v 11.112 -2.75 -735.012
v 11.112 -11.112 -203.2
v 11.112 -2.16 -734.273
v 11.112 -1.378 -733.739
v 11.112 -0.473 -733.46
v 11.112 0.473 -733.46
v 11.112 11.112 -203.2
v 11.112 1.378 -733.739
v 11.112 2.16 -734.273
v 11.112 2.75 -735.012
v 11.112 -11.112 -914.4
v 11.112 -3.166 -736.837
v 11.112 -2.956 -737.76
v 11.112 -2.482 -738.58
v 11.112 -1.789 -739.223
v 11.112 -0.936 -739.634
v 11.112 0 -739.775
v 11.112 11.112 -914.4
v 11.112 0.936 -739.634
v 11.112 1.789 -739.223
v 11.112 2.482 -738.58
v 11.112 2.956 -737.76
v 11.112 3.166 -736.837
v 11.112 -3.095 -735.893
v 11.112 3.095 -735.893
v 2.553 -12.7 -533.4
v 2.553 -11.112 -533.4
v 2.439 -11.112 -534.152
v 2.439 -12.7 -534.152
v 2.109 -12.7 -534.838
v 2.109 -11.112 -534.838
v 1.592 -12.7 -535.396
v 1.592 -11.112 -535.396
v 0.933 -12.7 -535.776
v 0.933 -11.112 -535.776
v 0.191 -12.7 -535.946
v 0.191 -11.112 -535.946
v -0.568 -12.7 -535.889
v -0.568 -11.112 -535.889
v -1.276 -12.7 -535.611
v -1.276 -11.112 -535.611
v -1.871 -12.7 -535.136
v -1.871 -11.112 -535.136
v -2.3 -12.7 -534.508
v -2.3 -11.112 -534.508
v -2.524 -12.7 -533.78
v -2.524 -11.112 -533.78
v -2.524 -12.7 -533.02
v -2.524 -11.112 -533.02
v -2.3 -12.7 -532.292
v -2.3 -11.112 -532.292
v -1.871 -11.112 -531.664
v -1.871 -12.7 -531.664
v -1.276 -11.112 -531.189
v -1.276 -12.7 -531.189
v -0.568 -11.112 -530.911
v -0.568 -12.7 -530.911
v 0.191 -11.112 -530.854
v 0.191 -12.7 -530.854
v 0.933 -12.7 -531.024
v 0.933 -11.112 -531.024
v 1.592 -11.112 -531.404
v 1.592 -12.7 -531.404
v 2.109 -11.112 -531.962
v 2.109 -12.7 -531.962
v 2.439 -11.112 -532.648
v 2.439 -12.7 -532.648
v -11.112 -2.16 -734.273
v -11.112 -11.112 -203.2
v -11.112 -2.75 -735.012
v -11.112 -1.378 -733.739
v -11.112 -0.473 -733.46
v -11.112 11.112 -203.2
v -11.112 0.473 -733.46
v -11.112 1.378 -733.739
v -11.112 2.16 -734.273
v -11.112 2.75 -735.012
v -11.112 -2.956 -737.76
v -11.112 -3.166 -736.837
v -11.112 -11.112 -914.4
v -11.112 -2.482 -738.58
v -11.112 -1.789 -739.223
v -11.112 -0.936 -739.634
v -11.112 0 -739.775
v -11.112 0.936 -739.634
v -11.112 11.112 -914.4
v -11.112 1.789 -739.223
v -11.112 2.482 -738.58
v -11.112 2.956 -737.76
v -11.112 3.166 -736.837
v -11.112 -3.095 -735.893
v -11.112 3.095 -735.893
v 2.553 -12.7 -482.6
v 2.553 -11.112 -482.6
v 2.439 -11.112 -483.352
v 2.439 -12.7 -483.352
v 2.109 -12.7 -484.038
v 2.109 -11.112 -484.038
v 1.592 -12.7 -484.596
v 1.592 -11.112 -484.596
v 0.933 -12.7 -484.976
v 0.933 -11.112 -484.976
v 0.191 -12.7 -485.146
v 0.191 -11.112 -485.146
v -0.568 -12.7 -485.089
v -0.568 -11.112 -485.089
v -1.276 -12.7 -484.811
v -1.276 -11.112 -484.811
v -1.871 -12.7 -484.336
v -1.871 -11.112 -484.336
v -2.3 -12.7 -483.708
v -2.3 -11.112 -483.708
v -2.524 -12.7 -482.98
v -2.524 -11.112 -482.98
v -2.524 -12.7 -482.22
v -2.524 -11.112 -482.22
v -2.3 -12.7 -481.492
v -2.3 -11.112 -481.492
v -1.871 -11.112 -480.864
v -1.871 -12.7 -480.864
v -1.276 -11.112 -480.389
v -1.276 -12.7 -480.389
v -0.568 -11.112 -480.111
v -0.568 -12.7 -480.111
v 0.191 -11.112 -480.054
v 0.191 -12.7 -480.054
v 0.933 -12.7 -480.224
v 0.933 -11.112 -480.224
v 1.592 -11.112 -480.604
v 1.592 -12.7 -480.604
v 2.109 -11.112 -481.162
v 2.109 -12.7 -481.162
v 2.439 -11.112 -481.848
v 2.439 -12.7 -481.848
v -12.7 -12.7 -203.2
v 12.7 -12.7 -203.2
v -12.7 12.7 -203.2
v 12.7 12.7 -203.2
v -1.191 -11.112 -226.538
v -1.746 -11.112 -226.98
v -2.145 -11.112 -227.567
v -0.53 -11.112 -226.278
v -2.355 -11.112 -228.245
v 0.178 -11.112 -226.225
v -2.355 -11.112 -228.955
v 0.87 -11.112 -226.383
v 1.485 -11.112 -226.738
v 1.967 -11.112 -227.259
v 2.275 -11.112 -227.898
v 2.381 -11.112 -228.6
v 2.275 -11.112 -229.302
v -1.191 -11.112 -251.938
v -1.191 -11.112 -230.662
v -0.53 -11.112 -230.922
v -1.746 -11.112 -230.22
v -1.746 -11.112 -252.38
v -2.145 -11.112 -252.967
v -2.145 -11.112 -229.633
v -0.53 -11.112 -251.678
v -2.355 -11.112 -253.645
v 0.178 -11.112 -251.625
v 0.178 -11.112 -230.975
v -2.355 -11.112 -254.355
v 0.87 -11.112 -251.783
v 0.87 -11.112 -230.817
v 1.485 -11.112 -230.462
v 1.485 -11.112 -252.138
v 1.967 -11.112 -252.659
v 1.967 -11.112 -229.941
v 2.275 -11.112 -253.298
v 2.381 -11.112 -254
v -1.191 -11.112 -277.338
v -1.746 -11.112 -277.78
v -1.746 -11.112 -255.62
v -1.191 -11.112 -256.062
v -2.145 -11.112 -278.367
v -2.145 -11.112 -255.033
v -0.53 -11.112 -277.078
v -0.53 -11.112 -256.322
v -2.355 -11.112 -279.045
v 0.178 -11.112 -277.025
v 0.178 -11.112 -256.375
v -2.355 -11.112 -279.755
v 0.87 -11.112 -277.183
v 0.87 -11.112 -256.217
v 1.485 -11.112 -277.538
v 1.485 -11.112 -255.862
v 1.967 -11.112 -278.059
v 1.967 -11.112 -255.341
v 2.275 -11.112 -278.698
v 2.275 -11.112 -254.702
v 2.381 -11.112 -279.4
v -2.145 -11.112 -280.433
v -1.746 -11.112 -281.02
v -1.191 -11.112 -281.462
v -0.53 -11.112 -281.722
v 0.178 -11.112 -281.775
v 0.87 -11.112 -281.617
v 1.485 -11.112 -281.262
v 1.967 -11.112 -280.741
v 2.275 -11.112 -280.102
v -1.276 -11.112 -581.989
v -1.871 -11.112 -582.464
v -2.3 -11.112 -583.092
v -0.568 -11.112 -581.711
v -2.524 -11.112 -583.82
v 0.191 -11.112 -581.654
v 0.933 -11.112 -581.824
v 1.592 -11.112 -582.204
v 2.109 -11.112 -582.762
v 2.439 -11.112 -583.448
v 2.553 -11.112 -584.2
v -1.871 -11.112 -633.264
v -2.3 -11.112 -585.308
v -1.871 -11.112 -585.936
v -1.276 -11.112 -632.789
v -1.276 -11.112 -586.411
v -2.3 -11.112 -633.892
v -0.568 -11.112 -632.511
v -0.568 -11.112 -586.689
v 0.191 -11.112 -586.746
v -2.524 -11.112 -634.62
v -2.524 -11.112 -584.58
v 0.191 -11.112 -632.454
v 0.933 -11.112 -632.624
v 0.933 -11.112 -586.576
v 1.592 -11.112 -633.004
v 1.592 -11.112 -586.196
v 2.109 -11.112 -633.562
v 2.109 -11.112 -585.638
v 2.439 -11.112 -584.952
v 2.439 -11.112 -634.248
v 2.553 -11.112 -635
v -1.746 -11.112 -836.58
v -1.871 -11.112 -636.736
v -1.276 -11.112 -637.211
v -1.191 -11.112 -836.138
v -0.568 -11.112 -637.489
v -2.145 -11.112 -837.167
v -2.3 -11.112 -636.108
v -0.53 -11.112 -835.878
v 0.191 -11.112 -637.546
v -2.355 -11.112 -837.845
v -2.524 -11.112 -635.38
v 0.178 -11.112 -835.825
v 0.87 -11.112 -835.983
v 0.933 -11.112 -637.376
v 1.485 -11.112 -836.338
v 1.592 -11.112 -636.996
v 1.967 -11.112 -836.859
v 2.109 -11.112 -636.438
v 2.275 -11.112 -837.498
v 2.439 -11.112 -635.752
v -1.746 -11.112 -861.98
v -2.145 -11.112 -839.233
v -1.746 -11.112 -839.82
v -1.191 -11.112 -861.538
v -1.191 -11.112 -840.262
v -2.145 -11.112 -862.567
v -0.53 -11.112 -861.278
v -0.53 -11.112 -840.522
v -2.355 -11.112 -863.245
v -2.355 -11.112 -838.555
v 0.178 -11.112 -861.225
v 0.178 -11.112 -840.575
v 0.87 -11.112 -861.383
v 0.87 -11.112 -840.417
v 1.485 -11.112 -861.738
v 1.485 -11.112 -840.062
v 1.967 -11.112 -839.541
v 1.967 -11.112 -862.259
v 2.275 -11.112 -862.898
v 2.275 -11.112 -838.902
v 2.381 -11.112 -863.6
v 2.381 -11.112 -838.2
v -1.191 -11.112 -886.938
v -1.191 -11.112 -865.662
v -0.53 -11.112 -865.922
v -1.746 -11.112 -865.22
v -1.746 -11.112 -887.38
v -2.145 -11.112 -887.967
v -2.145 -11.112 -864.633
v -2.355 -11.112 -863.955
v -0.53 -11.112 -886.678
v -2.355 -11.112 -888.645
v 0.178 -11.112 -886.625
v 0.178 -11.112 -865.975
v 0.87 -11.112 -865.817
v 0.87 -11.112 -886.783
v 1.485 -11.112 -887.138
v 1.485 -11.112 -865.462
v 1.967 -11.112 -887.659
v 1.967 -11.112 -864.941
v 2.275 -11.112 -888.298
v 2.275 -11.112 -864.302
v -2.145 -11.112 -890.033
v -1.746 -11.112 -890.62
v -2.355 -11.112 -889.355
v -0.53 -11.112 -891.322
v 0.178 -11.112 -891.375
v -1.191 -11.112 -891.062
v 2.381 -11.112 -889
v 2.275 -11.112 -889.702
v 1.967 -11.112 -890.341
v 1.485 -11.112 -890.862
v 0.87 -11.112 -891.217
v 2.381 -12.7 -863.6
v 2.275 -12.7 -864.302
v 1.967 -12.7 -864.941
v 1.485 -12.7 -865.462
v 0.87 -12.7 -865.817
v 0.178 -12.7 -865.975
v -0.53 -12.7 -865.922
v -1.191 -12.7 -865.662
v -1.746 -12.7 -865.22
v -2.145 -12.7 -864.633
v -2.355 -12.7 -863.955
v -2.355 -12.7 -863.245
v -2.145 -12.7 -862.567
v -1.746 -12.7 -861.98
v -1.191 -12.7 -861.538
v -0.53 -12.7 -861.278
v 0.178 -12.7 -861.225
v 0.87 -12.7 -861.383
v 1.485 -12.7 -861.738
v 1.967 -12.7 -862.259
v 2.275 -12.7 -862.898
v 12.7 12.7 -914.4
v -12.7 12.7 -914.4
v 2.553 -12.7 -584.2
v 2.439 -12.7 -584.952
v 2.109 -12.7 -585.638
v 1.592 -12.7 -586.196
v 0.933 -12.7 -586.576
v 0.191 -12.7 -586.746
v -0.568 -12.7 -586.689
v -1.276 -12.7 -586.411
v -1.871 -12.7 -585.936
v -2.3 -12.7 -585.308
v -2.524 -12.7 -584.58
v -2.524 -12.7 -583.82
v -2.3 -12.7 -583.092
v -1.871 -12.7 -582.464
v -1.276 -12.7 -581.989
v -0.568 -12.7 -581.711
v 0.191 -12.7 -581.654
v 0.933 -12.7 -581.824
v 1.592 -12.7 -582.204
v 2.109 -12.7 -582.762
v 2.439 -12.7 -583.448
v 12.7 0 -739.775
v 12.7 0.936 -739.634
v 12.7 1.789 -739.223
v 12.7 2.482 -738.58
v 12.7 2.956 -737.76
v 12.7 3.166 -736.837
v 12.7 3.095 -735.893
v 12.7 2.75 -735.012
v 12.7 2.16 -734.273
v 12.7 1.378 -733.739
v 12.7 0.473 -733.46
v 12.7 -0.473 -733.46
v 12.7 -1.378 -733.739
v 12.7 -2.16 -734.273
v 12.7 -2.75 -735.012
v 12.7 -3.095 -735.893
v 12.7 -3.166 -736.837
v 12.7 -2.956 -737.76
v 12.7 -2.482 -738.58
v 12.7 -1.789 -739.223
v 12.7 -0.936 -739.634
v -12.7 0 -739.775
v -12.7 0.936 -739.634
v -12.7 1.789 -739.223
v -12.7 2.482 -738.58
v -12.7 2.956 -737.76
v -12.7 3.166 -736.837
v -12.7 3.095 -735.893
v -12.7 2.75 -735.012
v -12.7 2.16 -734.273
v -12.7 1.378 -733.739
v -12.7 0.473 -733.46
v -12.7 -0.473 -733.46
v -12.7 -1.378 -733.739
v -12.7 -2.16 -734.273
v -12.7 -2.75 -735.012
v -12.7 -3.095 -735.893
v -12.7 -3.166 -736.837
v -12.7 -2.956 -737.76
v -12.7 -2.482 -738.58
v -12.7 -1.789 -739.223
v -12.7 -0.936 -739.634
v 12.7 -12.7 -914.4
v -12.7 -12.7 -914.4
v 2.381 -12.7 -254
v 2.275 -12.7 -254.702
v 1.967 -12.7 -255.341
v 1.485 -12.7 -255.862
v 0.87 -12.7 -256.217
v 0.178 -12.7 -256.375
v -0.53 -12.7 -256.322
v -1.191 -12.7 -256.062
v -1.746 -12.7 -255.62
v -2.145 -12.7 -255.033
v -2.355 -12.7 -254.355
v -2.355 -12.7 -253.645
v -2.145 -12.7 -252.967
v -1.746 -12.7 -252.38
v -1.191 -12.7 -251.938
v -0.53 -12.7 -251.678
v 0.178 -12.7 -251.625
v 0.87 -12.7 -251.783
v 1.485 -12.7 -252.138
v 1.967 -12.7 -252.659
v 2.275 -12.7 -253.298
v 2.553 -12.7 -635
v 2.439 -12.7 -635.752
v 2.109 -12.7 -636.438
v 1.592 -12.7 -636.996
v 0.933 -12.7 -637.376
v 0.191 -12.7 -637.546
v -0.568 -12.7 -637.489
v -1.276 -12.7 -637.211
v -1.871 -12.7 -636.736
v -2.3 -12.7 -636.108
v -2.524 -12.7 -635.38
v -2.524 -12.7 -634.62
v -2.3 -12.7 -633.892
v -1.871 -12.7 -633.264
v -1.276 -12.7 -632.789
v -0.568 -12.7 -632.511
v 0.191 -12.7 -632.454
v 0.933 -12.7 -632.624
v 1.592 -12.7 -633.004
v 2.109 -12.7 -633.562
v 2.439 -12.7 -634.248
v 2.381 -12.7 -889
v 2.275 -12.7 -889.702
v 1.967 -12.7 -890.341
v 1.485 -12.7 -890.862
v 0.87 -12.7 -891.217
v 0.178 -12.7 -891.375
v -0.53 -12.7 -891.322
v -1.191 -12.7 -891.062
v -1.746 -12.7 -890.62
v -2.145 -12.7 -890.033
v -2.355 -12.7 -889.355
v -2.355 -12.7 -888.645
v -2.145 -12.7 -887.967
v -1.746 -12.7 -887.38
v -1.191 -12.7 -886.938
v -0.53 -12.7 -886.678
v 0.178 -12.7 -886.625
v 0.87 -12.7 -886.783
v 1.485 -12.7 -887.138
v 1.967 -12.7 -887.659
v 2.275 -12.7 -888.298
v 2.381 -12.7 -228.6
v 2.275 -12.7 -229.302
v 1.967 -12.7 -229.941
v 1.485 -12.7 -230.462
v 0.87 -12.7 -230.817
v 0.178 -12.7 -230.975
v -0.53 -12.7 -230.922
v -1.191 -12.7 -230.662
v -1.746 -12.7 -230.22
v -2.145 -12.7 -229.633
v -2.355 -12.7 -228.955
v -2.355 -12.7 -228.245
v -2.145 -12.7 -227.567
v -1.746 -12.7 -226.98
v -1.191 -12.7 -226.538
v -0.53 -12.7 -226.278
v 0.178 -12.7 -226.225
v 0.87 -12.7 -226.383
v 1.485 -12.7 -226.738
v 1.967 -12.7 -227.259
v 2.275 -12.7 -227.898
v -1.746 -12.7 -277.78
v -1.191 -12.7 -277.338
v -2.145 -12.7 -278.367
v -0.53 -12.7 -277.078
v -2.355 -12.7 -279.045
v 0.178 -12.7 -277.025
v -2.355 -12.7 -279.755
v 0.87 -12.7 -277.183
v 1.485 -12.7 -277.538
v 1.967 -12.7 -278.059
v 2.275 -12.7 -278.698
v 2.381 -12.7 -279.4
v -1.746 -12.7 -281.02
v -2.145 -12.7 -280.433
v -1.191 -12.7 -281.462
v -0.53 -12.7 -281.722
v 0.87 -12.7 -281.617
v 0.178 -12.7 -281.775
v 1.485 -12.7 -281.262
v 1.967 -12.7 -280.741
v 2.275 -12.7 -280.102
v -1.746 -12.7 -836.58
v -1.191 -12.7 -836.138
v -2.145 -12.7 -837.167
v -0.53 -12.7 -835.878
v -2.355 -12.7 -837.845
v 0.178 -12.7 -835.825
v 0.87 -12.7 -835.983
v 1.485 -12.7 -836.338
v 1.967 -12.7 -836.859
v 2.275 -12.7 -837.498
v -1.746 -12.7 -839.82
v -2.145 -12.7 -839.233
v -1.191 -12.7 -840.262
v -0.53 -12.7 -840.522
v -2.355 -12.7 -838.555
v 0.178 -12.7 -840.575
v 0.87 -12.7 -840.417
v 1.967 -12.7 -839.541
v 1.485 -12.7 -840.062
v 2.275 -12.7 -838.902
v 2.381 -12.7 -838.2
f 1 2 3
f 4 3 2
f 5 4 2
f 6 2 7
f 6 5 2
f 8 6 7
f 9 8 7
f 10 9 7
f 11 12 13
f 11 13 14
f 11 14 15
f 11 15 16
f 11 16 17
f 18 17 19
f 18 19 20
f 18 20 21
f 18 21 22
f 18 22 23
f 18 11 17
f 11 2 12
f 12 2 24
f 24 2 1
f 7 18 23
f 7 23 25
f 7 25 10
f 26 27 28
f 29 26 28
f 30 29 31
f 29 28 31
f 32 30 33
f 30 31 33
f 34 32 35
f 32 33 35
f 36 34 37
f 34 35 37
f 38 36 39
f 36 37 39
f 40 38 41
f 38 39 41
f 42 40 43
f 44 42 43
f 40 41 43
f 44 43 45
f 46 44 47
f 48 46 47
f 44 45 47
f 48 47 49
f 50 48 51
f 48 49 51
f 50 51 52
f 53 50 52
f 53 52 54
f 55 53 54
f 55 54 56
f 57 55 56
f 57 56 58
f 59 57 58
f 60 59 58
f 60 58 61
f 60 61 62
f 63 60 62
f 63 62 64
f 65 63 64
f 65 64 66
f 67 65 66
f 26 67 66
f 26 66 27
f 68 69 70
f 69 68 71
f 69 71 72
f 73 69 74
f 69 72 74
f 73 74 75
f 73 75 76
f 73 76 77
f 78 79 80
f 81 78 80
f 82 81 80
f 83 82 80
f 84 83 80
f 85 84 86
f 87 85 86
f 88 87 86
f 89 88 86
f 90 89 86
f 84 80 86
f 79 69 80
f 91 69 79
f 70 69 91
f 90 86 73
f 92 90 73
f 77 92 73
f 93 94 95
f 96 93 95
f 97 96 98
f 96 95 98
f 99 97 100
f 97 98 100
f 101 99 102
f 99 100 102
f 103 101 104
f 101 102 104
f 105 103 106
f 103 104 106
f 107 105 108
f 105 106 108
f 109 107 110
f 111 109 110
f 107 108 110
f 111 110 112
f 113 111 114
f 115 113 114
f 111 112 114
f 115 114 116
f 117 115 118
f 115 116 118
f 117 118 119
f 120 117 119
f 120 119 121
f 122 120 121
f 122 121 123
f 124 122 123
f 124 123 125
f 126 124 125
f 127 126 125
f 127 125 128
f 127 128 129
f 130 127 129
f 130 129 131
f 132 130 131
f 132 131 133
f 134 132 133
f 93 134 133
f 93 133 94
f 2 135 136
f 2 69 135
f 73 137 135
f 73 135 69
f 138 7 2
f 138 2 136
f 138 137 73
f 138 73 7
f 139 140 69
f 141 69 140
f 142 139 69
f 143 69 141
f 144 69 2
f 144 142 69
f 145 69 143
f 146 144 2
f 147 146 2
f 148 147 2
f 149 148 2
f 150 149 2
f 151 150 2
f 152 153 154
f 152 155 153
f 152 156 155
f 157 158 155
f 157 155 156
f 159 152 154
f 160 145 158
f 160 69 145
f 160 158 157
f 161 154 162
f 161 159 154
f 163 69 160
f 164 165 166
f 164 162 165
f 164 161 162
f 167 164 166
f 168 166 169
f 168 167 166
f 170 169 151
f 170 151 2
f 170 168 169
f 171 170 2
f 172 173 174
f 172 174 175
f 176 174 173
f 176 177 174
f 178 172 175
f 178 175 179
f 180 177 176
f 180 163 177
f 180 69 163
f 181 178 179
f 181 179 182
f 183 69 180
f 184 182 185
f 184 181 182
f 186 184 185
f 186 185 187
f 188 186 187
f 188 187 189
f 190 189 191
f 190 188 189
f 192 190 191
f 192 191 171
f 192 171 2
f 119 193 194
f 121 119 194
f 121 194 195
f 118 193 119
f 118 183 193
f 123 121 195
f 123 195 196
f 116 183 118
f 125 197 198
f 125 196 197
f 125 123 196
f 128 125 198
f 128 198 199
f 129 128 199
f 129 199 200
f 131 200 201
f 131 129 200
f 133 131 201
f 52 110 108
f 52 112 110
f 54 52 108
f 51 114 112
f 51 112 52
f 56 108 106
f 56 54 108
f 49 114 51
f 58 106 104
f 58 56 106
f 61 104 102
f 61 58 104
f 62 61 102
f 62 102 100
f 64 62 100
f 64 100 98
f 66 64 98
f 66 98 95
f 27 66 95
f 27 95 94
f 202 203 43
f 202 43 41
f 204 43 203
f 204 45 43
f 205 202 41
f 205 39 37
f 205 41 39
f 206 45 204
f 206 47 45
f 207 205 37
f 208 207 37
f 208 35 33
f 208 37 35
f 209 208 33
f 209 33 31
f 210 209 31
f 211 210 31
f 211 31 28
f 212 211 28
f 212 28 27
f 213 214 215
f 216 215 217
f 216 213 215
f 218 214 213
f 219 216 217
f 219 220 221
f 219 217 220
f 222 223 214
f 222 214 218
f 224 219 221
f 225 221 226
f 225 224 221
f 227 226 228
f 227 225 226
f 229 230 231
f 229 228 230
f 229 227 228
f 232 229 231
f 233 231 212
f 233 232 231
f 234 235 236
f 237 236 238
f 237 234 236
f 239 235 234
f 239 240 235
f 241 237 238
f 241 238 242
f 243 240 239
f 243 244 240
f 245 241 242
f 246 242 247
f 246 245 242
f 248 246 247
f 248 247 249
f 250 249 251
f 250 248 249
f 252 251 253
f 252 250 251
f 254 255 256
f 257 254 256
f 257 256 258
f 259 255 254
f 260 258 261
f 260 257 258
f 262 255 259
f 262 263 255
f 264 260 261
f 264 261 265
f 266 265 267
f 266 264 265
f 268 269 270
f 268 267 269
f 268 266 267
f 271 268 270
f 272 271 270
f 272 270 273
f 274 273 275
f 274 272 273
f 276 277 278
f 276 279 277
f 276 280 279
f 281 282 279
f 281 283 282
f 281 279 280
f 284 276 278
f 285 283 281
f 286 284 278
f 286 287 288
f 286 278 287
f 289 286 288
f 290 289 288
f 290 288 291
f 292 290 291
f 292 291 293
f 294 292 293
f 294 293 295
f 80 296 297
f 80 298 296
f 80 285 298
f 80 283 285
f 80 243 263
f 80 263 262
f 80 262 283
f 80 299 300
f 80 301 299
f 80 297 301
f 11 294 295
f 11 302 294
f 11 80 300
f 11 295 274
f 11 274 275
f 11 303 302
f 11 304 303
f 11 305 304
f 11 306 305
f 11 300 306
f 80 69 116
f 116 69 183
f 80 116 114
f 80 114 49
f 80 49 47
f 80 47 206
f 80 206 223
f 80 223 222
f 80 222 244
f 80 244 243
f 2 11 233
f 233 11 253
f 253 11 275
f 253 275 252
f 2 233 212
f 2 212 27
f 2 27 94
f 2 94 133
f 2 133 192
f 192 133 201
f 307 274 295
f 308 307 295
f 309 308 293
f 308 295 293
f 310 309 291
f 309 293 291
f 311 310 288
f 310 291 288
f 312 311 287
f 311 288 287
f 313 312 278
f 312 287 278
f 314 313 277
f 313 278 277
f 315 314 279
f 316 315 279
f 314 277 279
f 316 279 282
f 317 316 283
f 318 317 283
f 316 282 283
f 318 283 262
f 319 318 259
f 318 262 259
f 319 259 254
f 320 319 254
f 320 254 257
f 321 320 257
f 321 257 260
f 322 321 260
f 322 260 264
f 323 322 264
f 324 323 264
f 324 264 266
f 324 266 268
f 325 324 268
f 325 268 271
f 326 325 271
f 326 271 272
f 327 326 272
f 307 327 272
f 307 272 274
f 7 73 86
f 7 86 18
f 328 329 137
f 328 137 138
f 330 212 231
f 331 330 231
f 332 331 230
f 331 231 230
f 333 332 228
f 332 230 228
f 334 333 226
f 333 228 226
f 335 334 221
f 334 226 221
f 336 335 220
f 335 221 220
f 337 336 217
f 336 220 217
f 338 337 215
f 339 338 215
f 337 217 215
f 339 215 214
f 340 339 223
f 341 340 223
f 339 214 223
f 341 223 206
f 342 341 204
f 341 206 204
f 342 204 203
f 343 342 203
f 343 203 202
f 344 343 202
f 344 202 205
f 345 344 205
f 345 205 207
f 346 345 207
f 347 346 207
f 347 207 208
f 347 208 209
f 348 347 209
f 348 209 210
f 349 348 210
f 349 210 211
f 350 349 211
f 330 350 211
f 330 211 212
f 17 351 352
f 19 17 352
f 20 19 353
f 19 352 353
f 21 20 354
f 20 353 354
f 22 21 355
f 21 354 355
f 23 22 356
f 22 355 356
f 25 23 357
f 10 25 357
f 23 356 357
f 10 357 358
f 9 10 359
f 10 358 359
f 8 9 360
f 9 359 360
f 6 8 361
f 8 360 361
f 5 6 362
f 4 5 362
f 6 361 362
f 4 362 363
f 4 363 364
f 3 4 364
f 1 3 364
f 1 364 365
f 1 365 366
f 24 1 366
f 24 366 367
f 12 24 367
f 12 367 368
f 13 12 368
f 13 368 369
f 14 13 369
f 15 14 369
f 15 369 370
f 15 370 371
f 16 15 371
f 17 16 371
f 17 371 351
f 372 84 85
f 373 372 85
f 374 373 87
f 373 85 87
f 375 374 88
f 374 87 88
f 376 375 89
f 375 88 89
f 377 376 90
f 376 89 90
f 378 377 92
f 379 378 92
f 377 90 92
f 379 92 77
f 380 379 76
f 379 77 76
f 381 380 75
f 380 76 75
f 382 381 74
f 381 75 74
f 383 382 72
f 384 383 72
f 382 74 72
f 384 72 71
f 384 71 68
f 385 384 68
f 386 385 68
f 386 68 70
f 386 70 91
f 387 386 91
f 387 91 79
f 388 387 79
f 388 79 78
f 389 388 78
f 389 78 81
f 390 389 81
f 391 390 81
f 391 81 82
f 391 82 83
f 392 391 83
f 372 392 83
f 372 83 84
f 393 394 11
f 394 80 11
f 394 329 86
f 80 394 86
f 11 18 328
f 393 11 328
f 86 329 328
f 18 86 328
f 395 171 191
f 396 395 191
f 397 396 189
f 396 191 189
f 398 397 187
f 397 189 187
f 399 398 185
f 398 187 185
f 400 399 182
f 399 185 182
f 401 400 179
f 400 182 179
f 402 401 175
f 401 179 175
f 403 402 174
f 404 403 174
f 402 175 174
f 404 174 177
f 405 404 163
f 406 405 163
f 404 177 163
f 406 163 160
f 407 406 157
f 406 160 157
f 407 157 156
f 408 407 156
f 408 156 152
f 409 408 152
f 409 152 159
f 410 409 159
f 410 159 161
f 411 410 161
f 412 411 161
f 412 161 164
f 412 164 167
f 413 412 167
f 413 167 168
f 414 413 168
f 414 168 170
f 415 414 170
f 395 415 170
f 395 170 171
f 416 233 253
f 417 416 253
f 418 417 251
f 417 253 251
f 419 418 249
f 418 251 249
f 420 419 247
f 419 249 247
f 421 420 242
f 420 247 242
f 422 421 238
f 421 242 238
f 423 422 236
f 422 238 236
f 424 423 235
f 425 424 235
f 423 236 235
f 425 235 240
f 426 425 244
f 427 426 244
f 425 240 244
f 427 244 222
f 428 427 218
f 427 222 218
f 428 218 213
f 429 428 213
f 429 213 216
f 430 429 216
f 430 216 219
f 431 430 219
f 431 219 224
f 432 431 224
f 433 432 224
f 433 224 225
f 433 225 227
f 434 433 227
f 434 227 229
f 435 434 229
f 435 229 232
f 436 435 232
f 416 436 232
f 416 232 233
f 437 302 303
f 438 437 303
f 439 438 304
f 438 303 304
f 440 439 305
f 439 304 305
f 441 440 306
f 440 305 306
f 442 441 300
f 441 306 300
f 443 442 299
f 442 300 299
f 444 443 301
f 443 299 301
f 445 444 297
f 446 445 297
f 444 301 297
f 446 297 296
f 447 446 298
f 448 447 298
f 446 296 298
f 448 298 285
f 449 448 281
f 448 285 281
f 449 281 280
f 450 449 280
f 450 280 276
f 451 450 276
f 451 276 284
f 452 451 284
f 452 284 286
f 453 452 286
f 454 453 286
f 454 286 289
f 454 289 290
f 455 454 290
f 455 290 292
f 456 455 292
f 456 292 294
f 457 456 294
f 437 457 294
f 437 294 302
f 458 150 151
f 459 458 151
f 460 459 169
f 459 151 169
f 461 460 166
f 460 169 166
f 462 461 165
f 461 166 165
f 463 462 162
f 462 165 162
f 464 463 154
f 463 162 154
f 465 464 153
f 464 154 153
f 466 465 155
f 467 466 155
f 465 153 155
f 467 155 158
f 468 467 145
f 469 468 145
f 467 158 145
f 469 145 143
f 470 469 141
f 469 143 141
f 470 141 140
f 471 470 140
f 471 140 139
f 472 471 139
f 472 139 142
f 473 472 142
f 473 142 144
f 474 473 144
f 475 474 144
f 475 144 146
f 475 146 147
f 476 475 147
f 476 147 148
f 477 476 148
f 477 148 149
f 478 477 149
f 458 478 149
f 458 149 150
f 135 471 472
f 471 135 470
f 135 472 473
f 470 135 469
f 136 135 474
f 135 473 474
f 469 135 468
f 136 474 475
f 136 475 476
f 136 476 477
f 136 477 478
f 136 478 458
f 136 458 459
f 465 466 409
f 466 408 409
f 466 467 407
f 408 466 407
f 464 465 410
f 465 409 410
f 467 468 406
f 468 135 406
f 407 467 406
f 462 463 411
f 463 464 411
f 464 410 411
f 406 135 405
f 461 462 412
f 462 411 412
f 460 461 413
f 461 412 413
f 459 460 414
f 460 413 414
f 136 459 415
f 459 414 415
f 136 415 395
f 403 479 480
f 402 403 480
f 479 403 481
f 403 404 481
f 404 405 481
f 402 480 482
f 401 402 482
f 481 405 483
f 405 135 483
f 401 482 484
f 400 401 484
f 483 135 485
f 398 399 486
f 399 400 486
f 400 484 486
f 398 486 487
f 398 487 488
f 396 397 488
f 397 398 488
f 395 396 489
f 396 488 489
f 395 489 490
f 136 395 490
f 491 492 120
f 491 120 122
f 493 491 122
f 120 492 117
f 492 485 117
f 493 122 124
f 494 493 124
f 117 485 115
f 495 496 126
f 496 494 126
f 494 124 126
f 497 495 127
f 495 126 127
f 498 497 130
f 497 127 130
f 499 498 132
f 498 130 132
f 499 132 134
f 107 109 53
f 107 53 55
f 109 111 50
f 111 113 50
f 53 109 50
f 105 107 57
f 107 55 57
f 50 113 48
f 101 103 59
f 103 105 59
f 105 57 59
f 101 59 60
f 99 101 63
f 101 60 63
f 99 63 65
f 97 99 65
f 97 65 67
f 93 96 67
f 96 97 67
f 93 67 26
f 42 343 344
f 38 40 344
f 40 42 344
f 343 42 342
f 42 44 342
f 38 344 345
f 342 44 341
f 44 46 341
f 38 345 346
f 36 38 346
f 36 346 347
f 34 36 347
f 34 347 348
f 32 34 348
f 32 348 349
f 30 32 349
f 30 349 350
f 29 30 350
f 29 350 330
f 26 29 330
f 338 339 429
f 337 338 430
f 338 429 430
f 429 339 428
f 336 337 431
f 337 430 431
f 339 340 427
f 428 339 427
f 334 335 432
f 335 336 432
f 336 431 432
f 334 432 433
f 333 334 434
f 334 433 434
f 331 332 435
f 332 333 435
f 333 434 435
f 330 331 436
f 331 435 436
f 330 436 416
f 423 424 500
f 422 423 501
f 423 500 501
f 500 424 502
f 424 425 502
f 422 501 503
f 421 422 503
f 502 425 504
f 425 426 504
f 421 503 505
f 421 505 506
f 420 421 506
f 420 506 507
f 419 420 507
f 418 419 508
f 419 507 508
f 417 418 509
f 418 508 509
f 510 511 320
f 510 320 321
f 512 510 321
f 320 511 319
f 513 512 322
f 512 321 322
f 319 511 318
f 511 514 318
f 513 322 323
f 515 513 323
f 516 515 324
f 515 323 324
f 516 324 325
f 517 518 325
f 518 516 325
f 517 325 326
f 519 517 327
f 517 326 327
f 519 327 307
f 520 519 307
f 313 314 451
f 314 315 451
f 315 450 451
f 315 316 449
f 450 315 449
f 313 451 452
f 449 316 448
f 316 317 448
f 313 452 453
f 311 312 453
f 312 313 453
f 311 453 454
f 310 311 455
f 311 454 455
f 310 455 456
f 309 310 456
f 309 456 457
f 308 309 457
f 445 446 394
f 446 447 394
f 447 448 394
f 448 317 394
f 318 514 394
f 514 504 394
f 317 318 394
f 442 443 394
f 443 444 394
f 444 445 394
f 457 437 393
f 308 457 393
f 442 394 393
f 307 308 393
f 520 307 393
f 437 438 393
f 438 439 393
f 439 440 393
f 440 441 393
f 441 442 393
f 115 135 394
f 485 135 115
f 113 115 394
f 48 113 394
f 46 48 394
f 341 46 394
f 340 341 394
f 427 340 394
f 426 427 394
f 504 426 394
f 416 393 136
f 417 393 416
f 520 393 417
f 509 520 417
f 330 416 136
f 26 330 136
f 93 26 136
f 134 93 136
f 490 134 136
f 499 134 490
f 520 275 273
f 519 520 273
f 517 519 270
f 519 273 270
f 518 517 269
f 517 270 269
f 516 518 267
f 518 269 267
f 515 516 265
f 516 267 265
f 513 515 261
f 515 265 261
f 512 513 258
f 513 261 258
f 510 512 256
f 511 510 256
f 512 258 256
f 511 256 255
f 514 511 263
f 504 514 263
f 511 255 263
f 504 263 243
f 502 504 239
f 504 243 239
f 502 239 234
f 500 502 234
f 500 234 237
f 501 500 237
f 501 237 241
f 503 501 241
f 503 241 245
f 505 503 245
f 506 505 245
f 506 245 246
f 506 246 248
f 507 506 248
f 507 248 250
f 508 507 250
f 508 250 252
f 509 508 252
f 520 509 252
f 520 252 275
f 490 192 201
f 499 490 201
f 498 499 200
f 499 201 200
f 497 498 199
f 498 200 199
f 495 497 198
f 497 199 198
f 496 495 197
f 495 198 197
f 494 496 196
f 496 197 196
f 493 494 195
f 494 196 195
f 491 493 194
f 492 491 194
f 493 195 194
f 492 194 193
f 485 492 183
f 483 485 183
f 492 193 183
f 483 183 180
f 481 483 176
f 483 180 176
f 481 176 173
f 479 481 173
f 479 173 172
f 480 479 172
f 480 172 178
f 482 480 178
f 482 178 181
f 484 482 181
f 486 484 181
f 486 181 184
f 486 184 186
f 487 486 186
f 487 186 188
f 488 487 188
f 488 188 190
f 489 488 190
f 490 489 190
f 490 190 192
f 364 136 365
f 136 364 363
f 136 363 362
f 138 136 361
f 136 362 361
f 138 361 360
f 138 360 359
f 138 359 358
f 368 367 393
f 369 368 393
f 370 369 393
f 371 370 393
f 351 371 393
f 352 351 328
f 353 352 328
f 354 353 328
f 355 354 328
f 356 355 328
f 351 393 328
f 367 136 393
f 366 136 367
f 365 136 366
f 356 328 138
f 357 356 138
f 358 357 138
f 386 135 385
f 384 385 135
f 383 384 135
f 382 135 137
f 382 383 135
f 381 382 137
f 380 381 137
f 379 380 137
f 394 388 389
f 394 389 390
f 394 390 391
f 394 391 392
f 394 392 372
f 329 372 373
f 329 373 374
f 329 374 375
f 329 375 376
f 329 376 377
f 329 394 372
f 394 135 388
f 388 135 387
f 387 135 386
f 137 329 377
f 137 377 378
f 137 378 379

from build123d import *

# Parameters (mm, degrees)
BOSS_EXTRUDE1_DEPTH                = 914.4
BOSS_EXTRUDE1_DEPTH_BACK           = 914.4
SKETCH3_W                          = 25.4
SKETCH3_H                          = 25.4
SKETCH3_W_2                        = 22.225
SKETCH3_H_2                        = 22.225
SKETCH5_W                          = 30.406422512
SKETCH5_H                          = 27.345599006
CUT_EXTRUDE1_DEPTH                 = 1117.6
F_1_4_0_25_DIAMETER_HOLE1_D        = 6.35
F_3_16_0_1875_DIAMETER_HOLE1_D     = 4.7625
F_3_16_0_1875_DIAMETER_HOLE1_DEPTH = 1.5875
F_10_CLEARANCE_HOLE1_D             = 5.1054
F_10_CLEARANCE_HOLE1_DEPTH         = 1.5875


with BuildPart() as part:
    # Sketch3 → Boss-Extrude1 (new, two sides: drawn at the far end of the back side and taken through both)
    with BuildSketch(Plane.XY.offset(-BOSS_EXTRUDE1_DEPTH_BACK)):
        Rectangle(SKETCH3_W, SKETCH3_H)
        Rectangle(SKETCH3_W_2, SKETCH3_H_2, mode=Mode.SUBTRACT)
    extrude(amount=BOSS_EXTRUDE1_DEPTH + BOSS_EXTRUDE1_DEPTH_BACK)

    # Sketch5 → Cut-Extrude1 (cut)
    with BuildSketch(Plane.XY.offset(914.4)):
        Rectangle(SKETCH5_W, SKETCH5_H)
    extrude(amount=-CUT_EXTRUDE1_DEPTH, mode=Mode.SUBTRACT)

    # 1/4 (0.25) Diameter Hole1 (through all)
    with Locations(Plane.ZY.offset(12.7)):
        with Locations((-736.6, 0)):
            Hole(F_1_4_0_25_DIAMETER_HOLE1_D / 2)

    # 3/16 (0.1875) Diameter Hole1
    with Locations(Plane(origin=(0, -12.7, 0), x_dir=(-1, 0, 0), z_dir=(0, -1, 0))):
        with Locations((0, 889), (0, 863.6), (0, 838.2), (0, 279.4), (0, 254), (0, 228.6)):
            Hole(F_3_16_0_1875_DIAMETER_HOLE1_D / 2, depth=F_3_16_0_1875_DIAMETER_HOLE1_DEPTH)

    # #10 Clearance Hole1
    with Locations(Plane(origin=(0, -12.7, 0), x_dir=(-1, 0, 0), z_dir=(0, -1, 0))):
        with Locations((0, 635), (0, 584.2), (0, 533.4), (0, 482.6)):
            Hole(F_10_CLEARANCE_HOLE1_D / 2, depth=F_10_CLEARANCE_HOLE1_DEPTH)


solid = part.part
